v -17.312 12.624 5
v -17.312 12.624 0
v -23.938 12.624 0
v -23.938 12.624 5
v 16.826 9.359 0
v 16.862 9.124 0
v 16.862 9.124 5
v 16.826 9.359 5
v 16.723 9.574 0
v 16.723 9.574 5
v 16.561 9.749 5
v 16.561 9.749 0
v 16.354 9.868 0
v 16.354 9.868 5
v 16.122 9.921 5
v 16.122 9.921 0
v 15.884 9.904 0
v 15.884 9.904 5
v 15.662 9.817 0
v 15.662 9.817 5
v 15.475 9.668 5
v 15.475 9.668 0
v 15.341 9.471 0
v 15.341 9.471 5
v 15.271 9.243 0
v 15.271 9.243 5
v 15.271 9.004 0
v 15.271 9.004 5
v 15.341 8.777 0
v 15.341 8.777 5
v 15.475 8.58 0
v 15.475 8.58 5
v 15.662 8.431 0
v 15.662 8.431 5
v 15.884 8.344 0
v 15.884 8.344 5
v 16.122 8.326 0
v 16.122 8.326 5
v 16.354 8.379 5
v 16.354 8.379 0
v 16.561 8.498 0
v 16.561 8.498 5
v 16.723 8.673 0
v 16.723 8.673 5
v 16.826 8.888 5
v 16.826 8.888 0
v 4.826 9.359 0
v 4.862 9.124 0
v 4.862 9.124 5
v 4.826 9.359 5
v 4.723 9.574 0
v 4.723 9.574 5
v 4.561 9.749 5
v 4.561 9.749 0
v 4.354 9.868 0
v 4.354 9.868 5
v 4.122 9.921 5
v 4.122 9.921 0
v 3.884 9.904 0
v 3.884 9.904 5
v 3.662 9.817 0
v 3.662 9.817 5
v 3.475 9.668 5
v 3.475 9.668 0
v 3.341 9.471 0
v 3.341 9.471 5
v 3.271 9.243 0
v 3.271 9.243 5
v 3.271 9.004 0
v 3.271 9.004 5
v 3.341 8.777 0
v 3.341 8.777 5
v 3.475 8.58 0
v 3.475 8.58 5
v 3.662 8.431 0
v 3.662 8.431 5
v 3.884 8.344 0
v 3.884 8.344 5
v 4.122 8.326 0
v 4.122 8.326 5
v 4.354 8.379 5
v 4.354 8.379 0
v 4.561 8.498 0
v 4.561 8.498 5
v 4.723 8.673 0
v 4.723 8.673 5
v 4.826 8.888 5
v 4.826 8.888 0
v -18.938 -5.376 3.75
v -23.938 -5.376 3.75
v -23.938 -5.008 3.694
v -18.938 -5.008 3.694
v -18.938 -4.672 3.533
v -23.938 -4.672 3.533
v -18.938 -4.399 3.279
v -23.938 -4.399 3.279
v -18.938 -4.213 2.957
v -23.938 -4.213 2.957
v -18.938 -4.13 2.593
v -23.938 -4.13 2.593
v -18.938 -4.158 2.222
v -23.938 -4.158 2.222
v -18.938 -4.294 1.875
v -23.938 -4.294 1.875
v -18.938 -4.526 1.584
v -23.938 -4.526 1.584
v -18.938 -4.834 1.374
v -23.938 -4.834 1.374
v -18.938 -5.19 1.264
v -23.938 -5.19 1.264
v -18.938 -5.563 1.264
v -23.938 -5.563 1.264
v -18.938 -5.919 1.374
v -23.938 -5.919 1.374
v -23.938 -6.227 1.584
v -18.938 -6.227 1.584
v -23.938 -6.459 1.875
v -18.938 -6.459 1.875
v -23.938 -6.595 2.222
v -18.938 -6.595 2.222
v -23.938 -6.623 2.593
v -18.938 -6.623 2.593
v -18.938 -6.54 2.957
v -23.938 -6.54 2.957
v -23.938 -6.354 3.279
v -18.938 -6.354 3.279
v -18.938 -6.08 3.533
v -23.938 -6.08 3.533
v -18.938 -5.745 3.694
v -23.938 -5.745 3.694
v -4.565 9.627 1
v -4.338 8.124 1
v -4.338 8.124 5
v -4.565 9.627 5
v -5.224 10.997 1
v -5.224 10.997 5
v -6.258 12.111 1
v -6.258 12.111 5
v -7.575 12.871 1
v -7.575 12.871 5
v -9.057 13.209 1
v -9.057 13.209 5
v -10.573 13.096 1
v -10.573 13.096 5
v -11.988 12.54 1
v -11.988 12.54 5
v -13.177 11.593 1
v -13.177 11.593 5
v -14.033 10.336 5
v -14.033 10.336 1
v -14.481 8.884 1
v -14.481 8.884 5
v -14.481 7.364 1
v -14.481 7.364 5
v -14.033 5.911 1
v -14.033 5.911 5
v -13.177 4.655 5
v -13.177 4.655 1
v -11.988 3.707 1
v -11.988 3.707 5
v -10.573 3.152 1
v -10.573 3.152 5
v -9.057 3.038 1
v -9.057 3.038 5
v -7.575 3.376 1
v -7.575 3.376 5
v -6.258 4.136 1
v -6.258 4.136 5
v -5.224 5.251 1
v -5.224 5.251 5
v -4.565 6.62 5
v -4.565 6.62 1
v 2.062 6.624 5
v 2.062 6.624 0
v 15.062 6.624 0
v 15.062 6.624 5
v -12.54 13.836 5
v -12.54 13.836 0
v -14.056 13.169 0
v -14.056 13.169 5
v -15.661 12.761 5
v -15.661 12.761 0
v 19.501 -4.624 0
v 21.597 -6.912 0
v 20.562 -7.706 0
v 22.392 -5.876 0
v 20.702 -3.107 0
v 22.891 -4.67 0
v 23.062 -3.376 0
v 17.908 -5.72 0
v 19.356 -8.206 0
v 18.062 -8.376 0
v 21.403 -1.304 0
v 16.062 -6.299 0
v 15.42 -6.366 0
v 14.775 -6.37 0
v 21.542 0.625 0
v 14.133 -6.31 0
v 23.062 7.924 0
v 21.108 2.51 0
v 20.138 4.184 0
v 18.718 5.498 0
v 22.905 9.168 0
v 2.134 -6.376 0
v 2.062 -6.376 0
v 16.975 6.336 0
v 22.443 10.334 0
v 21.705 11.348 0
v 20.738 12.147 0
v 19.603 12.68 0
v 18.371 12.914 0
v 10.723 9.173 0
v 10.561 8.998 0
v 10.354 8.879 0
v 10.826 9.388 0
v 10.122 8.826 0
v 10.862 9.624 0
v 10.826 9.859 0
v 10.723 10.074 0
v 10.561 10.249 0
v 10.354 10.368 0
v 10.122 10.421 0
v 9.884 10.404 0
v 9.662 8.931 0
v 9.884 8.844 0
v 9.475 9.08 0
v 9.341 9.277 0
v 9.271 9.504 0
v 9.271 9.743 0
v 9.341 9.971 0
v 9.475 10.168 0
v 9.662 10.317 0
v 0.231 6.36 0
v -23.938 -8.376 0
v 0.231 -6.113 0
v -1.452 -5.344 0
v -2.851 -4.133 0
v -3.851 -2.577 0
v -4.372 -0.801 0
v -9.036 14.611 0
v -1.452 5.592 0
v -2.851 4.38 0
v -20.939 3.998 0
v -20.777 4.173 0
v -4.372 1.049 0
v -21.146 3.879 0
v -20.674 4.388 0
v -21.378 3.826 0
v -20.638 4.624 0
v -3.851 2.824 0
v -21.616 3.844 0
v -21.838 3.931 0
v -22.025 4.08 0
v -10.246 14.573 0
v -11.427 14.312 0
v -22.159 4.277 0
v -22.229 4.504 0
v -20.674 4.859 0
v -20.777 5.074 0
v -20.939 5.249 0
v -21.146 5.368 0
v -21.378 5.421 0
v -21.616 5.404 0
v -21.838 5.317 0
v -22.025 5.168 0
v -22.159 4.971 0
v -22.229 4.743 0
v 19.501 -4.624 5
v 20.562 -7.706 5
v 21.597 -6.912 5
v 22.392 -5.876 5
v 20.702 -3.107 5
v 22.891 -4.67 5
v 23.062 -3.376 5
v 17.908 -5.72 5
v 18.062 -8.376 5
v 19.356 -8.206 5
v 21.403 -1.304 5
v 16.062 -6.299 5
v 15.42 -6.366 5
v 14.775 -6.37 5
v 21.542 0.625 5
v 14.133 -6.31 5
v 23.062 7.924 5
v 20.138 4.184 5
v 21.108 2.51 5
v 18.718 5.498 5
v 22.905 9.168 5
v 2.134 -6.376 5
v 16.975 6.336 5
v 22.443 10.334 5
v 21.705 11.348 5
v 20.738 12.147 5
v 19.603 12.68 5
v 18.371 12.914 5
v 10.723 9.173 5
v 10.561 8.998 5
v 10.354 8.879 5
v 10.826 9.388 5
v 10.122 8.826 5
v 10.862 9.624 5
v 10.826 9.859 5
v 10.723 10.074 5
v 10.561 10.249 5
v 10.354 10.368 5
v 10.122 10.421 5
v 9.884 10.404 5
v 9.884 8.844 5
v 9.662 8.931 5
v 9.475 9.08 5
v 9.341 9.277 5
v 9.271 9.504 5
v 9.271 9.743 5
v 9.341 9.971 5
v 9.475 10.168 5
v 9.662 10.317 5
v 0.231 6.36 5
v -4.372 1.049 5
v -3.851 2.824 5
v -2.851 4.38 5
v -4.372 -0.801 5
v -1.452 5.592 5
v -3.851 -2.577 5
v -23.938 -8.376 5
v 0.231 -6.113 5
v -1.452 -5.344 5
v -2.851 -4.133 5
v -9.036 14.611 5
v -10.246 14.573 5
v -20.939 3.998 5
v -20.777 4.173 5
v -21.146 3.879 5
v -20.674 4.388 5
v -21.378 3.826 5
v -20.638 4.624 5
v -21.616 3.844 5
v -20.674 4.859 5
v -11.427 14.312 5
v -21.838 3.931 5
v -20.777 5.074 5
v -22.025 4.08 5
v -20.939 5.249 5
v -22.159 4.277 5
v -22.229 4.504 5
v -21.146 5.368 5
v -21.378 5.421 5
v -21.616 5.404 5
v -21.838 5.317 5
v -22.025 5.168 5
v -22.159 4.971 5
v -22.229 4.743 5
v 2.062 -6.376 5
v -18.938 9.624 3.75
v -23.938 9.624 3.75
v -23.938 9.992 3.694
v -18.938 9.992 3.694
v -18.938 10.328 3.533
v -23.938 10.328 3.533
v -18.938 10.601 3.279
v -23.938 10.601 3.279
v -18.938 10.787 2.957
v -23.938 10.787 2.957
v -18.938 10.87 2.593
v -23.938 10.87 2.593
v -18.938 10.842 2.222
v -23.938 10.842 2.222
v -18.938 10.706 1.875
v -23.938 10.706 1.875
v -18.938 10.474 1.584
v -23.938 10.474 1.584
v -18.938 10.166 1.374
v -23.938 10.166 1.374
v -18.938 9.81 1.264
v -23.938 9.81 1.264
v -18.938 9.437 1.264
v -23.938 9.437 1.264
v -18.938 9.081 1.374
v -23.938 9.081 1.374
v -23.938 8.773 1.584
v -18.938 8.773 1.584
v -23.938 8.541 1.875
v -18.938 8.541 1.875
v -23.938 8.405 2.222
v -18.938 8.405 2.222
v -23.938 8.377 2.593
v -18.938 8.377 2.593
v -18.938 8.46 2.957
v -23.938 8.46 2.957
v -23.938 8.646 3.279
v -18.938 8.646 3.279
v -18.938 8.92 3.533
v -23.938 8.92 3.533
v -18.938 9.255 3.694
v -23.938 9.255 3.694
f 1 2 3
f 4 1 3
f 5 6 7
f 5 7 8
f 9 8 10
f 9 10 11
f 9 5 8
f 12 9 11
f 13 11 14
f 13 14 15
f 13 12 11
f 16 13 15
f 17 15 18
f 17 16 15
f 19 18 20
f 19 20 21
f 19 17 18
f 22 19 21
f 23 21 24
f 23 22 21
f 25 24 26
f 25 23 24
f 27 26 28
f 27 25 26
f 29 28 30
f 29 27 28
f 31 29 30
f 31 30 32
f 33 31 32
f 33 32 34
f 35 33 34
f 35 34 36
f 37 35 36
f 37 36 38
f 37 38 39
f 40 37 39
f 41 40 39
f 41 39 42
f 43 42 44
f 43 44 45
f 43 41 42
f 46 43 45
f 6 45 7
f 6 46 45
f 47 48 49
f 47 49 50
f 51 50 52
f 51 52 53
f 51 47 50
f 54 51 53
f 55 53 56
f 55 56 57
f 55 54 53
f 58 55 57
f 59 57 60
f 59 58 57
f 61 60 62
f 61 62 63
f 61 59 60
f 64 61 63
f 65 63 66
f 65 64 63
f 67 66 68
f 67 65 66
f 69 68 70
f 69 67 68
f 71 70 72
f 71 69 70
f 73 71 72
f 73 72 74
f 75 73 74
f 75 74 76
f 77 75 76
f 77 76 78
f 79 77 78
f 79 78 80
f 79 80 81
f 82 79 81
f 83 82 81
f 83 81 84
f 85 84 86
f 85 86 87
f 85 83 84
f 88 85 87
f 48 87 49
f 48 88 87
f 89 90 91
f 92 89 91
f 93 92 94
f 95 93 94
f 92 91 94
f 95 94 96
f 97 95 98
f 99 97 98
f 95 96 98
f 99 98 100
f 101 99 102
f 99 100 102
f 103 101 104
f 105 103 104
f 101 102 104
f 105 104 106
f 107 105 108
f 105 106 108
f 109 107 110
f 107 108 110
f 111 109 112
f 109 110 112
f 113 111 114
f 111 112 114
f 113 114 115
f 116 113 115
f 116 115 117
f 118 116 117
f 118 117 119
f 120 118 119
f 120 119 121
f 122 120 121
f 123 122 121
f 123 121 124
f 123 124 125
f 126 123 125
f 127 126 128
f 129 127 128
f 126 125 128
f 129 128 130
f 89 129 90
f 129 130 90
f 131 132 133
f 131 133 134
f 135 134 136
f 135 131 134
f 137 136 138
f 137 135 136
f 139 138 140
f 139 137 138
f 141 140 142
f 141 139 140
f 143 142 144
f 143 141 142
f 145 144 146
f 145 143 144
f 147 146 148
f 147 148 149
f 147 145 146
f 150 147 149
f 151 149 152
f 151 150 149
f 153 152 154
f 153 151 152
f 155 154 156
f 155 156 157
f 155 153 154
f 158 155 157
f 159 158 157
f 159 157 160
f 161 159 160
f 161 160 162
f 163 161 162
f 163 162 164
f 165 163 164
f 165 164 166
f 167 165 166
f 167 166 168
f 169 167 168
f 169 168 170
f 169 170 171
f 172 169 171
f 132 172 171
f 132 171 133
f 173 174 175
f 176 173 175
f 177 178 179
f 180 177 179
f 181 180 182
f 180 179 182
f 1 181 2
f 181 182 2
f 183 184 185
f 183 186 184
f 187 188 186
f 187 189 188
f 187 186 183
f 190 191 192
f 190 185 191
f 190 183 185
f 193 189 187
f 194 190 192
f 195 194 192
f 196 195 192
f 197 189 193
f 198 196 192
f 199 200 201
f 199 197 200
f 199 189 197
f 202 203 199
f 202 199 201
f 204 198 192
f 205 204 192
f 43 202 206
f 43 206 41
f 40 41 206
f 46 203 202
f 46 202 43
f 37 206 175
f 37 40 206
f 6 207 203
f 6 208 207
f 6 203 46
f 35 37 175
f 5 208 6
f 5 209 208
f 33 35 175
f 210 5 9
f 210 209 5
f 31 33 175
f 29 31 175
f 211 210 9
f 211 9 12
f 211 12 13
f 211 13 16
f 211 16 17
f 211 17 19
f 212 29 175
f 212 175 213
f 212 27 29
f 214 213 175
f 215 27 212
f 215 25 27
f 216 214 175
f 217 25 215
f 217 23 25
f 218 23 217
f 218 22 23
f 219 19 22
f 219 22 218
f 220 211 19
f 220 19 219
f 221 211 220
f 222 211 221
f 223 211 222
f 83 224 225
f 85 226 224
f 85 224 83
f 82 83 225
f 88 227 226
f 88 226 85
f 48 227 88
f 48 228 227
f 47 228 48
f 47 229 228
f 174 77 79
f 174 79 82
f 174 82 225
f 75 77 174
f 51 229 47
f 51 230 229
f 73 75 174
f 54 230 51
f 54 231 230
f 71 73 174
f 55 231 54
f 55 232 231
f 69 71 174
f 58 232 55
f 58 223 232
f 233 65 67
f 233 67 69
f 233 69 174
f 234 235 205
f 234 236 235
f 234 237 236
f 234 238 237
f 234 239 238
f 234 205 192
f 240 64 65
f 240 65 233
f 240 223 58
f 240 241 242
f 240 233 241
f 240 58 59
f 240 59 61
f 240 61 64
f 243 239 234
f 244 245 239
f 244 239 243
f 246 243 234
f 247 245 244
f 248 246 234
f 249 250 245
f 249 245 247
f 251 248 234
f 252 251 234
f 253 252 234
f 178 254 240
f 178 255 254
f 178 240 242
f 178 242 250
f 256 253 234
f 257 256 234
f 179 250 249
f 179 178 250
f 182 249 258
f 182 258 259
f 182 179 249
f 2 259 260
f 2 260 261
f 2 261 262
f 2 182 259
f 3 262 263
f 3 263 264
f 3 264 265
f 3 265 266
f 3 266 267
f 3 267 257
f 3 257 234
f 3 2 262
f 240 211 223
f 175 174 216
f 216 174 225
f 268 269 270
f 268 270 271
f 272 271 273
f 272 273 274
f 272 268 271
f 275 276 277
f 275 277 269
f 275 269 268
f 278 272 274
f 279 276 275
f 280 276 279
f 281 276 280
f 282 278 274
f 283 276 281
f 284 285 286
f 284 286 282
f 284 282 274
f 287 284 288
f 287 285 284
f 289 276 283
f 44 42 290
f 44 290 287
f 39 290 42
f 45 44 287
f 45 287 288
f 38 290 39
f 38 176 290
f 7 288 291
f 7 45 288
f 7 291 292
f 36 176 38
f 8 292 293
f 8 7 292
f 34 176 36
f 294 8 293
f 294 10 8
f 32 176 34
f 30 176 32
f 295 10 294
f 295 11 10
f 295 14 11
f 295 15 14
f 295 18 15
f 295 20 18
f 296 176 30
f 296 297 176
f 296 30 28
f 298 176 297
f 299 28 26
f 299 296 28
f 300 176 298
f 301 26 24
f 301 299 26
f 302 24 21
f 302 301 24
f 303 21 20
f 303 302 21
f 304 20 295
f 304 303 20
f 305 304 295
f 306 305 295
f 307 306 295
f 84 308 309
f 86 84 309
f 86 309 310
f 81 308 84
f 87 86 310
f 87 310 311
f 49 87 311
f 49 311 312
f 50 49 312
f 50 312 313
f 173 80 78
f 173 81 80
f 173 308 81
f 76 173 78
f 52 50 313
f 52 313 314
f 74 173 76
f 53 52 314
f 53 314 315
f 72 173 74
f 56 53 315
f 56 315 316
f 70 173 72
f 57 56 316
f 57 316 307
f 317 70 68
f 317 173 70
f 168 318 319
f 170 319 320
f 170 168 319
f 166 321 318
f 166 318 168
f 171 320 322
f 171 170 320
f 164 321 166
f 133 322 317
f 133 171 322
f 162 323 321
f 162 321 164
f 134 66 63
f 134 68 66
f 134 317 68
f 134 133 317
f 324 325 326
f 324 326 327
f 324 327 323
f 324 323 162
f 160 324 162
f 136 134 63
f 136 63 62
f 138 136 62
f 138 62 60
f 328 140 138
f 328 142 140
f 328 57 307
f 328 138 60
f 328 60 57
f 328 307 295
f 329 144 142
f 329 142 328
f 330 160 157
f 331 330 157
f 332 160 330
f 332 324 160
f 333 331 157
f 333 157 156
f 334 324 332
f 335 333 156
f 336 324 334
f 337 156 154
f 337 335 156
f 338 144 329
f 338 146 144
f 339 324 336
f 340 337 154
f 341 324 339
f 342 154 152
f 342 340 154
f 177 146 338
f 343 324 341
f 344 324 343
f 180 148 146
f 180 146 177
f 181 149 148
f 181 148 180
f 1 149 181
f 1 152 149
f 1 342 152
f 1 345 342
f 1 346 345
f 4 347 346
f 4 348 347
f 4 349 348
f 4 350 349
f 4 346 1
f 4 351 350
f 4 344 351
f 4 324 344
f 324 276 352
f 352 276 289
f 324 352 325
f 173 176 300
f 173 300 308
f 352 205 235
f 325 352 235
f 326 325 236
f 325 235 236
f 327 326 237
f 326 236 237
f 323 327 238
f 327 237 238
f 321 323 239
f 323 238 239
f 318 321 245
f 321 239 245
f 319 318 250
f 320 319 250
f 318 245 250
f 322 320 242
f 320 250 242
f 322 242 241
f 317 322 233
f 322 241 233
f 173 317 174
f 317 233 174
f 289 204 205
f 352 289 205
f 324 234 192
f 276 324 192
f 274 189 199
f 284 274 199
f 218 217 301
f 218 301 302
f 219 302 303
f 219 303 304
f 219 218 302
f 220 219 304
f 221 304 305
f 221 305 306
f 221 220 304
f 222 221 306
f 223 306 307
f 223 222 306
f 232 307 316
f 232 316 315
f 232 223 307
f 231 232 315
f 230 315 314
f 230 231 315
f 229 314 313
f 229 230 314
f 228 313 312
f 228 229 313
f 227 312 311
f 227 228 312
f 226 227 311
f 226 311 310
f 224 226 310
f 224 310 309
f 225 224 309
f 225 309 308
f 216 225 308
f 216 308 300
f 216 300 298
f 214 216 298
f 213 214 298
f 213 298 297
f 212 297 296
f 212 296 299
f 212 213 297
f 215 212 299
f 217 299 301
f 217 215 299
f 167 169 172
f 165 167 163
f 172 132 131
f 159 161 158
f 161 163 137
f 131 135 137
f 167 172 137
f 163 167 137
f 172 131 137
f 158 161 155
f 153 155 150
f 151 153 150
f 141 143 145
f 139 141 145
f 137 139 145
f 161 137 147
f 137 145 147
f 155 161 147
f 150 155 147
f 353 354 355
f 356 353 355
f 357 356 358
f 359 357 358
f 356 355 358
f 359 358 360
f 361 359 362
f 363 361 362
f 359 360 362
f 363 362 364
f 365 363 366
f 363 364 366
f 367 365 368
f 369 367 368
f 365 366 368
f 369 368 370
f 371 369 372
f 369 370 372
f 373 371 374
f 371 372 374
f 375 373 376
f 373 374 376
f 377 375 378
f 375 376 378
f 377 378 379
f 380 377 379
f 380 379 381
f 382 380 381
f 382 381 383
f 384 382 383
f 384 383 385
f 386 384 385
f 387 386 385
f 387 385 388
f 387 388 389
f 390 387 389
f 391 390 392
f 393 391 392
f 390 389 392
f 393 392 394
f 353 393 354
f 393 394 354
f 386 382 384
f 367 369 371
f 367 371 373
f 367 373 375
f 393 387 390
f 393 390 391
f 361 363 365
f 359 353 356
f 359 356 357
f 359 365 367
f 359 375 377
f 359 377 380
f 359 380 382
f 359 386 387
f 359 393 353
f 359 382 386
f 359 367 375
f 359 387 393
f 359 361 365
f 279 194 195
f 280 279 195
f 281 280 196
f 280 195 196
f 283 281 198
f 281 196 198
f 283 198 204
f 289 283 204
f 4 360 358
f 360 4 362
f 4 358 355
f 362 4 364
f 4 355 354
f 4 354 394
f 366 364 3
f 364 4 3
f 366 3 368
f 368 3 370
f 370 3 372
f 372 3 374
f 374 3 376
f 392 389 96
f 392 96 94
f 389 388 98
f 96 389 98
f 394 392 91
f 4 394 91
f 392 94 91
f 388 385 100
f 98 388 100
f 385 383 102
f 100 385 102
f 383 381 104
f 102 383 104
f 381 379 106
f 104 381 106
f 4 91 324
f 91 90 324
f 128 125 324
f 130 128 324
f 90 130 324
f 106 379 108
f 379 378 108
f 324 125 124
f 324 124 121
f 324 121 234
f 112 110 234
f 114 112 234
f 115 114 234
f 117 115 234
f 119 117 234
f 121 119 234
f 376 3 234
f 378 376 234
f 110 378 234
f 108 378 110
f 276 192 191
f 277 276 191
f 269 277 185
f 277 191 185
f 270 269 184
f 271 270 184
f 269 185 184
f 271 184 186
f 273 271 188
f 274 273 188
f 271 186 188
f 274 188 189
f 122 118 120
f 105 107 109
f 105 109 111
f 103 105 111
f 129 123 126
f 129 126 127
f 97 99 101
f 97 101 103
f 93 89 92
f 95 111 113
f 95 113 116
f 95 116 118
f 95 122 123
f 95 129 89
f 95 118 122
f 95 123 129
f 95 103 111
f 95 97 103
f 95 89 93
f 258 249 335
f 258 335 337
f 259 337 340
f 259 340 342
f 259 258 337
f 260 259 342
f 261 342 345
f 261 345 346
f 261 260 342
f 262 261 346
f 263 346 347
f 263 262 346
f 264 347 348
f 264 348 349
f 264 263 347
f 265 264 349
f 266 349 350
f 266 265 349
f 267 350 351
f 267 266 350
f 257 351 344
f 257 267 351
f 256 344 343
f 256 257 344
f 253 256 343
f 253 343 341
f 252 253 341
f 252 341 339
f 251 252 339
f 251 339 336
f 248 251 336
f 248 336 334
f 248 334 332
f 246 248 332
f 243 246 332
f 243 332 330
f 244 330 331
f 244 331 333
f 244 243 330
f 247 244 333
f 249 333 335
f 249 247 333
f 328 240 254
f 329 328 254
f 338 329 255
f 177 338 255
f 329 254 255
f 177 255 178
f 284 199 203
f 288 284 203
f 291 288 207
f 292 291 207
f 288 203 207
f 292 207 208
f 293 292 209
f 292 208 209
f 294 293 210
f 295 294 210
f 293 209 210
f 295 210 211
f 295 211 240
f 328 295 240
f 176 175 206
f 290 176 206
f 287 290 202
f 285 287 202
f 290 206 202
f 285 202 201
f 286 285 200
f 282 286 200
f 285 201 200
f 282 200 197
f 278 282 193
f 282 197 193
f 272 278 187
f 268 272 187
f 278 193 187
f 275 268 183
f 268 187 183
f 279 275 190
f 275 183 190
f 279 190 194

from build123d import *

# Parameters (mm, degrees)
SKETCH1_R           = 0.8
SKETCH1_R_2         = 5.1
BOSS_EXTRUDE1_DEPTH = 5
SKETCH2_R           = 1.25
CUT_EXTRUDE1_DEPTH  = 5
SKETCH21_R          = 5.1
BOSS_EXTRUDE2_DEPTH = 1


with BuildPart() as part:
    # Sketch1 → Boss-Extrude1 (new body)
    with BuildSketch(Plane(origin=(0, 0, 0), x_dir=(0, 1, 0), z_dir=(0, 0, 1))):
        with BuildLine():
            ThreePointArc((7.923715338, -23.061842121), (11.348253353, -21.704991773), (12.914157128, -18.370857874))
            Line((12.914157128, -18.370857874), (14.611258571, 9.036437401))
            ThreePointArc((14.611258571, 9.036437401), (14.470096631, 10.842810788), (13.835805455, 12.540039768))
            ThreePointArc((13.835805455, 12.540039768), (12.931450551, 14.850335933), (12.623684243, 17.312165753))
            Line((12.623684243, 17.312165753), (12.623684243, 23.938157879))
            Line((12.623684243, 23.938157879), (-8.376315757, 23.938157879))
            Line((-8.376315757, 23.938157879), (-8.376315757, -18.061842121))
            ThreePointArc((-8.376315757, -18.061842121), (-6.911849663, -21.597376027), (-3.376315757, -23.061842121))
            Line((-3.376315757, -23.061842121), (7.923715338, -23.061842121))
        make_face()
        with BuildLine():
            Line((-6.37591859, -2.133696229), (-6.376315757, -2.061842121))
            ThreePointArc((-6.376315757, -2.061842121), (0.123684243, 4.438157879), (6.623684243, -2.061842121))
            Line((6.623684243, -2.061842121), (6.623684243, -15.061842121))
            ThreePointArc((6.623684243, -15.061842121), (0.625179068, -21.542467318), (-6.298932046, -16.061842121))
            ThreePointArc((-6.298932046, -16.061842121), (-6.376216465, -15.097769724), (-6.309594086, -14.132901895))
            Line((-6.309594086, -14.132901895), (-6.37591859, -2.133696229))
        make_face(mode=Mode.SUBTRACT)
        with Locations(Location((9.123684243, -16.061842121, 0), (0, 0, 270))):
            Circle(SKETCH1_R, mode=Mode.SUBTRACT)
        with Locations(Location((9.623684243, -10.061842121, 0), (0, 0, 270))):
            Circle(SKETCH1_R, mode=Mode.SUBTRACT)
        with Locations(Location((9.123684243, -4.061842121, 0), (0, 0, 270))):
            Circle(SKETCH1_R, mode=Mode.SUBTRACT)
        with Locations(Location((8.123684243, 9.438157879, 0), (0, 0, 270))):
            Circle(SKETCH1_R_2, mode=Mode.SUBTRACT)
        with Locations(Location((4.623684243, 21.438157879, 0), (0, 0, 270))):
            Circle(SKETCH1_R, mode=Mode.SUBTRACT)
    extrude(amount=BOSS_EXTRUDE1_DEPTH)

    # Sketch2 → Cut-Extrude1 (cut)
    with BuildSketch(Plane(origin=(-23.938157879, 0, 0), x_dir=(0, -1, 0), z_dir=(-1, 0, 0))):
        with Locations(Location((-9.623684243, 2.5, 0), (0, 0, 90))):
            Circle(SKETCH2_R)
        with Locations(Location((5.376315757, 2.5, 0), (0, 0, 90))):
            Circle(SKETCH2_R)
    extrude(amount=-CUT_EXTRUDE1_DEPTH, mode=Mode.SUBTRACT)

    # Sketch21 → Boss-Extrude2 (add)
    with BuildSketch(Plane(origin=(0, 0, 0), x_dir=(1, 0, 0), z_dir=(0, 0, -1))):
        with Locations(Location((-9.438157879, -8.123684243, 0), (0, 0, 180))):
            Circle(SKETCH21_R)
    extrude(amount=-BOSS_EXTRUDE2_DEPTH)


solid = part.part
